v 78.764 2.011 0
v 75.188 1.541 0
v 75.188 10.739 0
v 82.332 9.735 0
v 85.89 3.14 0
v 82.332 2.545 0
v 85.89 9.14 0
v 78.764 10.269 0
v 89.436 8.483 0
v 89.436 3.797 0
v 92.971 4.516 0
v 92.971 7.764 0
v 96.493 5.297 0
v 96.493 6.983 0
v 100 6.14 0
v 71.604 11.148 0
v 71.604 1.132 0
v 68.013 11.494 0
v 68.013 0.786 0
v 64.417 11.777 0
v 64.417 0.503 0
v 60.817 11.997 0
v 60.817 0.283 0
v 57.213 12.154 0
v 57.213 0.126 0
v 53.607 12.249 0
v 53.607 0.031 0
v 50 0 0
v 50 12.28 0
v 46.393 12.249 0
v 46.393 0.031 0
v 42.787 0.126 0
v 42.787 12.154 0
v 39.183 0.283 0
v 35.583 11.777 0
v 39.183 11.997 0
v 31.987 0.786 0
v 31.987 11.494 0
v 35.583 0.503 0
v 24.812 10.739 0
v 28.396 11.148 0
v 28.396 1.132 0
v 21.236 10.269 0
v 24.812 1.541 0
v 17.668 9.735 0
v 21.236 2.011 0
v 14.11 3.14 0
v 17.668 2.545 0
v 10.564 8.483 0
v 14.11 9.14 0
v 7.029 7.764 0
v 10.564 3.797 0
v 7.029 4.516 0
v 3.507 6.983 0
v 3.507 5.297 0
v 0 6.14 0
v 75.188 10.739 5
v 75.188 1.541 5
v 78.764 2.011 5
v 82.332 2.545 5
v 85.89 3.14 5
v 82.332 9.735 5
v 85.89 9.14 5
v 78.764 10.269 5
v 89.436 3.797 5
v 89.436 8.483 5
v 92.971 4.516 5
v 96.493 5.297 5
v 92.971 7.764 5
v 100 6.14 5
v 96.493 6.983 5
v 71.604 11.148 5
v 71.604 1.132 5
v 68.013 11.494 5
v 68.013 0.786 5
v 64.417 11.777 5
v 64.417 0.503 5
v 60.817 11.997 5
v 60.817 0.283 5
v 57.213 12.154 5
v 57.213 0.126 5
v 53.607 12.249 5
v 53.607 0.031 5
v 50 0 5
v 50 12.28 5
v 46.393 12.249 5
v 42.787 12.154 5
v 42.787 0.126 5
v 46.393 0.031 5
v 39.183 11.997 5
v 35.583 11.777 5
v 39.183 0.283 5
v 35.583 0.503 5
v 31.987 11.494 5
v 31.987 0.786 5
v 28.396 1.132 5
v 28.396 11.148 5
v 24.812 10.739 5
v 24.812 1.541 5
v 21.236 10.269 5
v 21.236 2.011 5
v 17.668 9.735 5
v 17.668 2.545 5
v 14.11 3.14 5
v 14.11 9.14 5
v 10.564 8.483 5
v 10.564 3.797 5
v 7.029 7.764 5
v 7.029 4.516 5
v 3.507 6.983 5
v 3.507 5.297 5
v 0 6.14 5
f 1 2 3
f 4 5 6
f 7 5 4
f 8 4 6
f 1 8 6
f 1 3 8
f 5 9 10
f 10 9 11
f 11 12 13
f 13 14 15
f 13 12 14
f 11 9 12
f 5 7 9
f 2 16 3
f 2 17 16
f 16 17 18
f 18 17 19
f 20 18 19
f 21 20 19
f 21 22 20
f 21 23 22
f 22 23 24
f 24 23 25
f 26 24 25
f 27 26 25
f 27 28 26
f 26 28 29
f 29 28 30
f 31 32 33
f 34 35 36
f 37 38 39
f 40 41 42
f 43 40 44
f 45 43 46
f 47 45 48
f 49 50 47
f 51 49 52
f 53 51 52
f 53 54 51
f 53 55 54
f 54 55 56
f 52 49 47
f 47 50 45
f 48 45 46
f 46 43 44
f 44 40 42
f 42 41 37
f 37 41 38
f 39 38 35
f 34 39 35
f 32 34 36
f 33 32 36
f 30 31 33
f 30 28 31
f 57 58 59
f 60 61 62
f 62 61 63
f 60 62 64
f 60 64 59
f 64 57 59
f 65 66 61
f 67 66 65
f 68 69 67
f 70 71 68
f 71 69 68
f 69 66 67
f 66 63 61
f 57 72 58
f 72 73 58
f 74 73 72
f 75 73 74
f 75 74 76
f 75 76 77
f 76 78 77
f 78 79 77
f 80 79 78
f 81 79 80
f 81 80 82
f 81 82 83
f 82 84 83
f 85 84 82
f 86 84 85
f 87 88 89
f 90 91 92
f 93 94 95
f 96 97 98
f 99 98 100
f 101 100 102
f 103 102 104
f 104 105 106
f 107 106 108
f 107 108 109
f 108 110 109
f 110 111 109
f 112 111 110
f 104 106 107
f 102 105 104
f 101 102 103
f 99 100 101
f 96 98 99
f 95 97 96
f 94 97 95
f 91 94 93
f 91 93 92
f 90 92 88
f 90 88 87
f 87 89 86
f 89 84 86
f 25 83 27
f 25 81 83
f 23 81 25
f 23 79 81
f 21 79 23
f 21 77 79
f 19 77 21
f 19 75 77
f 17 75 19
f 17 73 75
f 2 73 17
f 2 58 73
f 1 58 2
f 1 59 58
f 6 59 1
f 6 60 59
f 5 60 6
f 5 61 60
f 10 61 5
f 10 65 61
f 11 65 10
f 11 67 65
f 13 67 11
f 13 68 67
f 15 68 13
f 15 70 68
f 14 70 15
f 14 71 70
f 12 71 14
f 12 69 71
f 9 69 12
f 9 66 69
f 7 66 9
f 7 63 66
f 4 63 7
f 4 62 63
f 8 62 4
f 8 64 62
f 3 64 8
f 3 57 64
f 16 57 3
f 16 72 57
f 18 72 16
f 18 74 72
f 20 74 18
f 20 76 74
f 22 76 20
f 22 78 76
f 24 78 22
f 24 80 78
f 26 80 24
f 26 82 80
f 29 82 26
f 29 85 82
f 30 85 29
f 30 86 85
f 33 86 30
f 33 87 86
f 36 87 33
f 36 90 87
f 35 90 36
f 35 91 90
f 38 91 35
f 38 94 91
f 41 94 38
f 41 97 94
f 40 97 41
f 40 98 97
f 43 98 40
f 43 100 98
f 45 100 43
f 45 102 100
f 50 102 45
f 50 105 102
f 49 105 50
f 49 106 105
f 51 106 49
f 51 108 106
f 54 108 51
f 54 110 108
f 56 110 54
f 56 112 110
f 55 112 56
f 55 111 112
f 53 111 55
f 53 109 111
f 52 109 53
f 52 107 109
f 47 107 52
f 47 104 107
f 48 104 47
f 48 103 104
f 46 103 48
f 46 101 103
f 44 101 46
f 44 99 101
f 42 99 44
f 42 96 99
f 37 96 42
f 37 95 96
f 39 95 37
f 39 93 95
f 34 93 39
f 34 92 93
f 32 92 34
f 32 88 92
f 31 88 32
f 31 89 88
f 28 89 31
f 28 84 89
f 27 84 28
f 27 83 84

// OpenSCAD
$fn = 32;

// ----------------------------------------------------------------------
// Arc profile plate: lens, 56 points
// ----------------------------------------------------------------------

// --- parameters (mm) ---
lens_chord = 100;         // chord length of the lens, X
arc_r = 206.68;           // radius of both arcs
arc_angle = 28;           // angle of each arc, degrees
sagitta = 6.14;           // bulge of each arc (half the lens height)
arc_step = 1;             // sampling step of the arcs, degrees
plate_t = 5;              // plate thickness, Z

bbox_y = 2 * sagitta;  // full lens height

profile = [[100, 6.14], [96.493, 6.983], [92.971, 7.764], [89.436, 8.483], [85.89, 9.14], [82.332, 9.735], [78.764, 10.269], [75.188, 10.739], [71.604, 11.148], [68.013, 11.494], [64.417, 11.777], [60.817, 11.997], [57.213, 12.154], [53.607, 12.249], [50, 12.28], [46.393, 12.249], [42.787, 12.154], [39.183, 11.997], [35.583, 11.777], [31.987, 11.494], [28.396, 11.148], [24.812, 10.739], [21.236, 10.269], [17.668, 9.735], [14.11, 9.14], [10.564, 8.483], [7.029, 7.764], [3.507, 6.983], [0, 6.14], [3.507, 5.297], [7.029, 4.516], [10.564, 3.797], [14.11, 3.14], [17.668, 2.545], [21.236, 2.011], [24.812, 1.541], [28.396, 1.132], [31.987, 0.786], [35.583, 0.503], [39.183, 0.283], [42.787, 0.126], [46.393, 0.031], [50, 0], [53.607, 0.031], [57.213, 0.126], [60.817, 0.283], [64.417, 0.503], [68.013, 0.786], [71.604, 1.132], [75.188, 1.541], [78.764, 2.011], [82.332, 2.545], [85.89, 3.14], [89.436, 3.797], [92.971, 4.516], [96.493, 5.297]];  // primary outline, 56 points, counter clockwise

// --- the one profile operation ---
linear_extrude(height = plate_t) polygon(points = profile);
